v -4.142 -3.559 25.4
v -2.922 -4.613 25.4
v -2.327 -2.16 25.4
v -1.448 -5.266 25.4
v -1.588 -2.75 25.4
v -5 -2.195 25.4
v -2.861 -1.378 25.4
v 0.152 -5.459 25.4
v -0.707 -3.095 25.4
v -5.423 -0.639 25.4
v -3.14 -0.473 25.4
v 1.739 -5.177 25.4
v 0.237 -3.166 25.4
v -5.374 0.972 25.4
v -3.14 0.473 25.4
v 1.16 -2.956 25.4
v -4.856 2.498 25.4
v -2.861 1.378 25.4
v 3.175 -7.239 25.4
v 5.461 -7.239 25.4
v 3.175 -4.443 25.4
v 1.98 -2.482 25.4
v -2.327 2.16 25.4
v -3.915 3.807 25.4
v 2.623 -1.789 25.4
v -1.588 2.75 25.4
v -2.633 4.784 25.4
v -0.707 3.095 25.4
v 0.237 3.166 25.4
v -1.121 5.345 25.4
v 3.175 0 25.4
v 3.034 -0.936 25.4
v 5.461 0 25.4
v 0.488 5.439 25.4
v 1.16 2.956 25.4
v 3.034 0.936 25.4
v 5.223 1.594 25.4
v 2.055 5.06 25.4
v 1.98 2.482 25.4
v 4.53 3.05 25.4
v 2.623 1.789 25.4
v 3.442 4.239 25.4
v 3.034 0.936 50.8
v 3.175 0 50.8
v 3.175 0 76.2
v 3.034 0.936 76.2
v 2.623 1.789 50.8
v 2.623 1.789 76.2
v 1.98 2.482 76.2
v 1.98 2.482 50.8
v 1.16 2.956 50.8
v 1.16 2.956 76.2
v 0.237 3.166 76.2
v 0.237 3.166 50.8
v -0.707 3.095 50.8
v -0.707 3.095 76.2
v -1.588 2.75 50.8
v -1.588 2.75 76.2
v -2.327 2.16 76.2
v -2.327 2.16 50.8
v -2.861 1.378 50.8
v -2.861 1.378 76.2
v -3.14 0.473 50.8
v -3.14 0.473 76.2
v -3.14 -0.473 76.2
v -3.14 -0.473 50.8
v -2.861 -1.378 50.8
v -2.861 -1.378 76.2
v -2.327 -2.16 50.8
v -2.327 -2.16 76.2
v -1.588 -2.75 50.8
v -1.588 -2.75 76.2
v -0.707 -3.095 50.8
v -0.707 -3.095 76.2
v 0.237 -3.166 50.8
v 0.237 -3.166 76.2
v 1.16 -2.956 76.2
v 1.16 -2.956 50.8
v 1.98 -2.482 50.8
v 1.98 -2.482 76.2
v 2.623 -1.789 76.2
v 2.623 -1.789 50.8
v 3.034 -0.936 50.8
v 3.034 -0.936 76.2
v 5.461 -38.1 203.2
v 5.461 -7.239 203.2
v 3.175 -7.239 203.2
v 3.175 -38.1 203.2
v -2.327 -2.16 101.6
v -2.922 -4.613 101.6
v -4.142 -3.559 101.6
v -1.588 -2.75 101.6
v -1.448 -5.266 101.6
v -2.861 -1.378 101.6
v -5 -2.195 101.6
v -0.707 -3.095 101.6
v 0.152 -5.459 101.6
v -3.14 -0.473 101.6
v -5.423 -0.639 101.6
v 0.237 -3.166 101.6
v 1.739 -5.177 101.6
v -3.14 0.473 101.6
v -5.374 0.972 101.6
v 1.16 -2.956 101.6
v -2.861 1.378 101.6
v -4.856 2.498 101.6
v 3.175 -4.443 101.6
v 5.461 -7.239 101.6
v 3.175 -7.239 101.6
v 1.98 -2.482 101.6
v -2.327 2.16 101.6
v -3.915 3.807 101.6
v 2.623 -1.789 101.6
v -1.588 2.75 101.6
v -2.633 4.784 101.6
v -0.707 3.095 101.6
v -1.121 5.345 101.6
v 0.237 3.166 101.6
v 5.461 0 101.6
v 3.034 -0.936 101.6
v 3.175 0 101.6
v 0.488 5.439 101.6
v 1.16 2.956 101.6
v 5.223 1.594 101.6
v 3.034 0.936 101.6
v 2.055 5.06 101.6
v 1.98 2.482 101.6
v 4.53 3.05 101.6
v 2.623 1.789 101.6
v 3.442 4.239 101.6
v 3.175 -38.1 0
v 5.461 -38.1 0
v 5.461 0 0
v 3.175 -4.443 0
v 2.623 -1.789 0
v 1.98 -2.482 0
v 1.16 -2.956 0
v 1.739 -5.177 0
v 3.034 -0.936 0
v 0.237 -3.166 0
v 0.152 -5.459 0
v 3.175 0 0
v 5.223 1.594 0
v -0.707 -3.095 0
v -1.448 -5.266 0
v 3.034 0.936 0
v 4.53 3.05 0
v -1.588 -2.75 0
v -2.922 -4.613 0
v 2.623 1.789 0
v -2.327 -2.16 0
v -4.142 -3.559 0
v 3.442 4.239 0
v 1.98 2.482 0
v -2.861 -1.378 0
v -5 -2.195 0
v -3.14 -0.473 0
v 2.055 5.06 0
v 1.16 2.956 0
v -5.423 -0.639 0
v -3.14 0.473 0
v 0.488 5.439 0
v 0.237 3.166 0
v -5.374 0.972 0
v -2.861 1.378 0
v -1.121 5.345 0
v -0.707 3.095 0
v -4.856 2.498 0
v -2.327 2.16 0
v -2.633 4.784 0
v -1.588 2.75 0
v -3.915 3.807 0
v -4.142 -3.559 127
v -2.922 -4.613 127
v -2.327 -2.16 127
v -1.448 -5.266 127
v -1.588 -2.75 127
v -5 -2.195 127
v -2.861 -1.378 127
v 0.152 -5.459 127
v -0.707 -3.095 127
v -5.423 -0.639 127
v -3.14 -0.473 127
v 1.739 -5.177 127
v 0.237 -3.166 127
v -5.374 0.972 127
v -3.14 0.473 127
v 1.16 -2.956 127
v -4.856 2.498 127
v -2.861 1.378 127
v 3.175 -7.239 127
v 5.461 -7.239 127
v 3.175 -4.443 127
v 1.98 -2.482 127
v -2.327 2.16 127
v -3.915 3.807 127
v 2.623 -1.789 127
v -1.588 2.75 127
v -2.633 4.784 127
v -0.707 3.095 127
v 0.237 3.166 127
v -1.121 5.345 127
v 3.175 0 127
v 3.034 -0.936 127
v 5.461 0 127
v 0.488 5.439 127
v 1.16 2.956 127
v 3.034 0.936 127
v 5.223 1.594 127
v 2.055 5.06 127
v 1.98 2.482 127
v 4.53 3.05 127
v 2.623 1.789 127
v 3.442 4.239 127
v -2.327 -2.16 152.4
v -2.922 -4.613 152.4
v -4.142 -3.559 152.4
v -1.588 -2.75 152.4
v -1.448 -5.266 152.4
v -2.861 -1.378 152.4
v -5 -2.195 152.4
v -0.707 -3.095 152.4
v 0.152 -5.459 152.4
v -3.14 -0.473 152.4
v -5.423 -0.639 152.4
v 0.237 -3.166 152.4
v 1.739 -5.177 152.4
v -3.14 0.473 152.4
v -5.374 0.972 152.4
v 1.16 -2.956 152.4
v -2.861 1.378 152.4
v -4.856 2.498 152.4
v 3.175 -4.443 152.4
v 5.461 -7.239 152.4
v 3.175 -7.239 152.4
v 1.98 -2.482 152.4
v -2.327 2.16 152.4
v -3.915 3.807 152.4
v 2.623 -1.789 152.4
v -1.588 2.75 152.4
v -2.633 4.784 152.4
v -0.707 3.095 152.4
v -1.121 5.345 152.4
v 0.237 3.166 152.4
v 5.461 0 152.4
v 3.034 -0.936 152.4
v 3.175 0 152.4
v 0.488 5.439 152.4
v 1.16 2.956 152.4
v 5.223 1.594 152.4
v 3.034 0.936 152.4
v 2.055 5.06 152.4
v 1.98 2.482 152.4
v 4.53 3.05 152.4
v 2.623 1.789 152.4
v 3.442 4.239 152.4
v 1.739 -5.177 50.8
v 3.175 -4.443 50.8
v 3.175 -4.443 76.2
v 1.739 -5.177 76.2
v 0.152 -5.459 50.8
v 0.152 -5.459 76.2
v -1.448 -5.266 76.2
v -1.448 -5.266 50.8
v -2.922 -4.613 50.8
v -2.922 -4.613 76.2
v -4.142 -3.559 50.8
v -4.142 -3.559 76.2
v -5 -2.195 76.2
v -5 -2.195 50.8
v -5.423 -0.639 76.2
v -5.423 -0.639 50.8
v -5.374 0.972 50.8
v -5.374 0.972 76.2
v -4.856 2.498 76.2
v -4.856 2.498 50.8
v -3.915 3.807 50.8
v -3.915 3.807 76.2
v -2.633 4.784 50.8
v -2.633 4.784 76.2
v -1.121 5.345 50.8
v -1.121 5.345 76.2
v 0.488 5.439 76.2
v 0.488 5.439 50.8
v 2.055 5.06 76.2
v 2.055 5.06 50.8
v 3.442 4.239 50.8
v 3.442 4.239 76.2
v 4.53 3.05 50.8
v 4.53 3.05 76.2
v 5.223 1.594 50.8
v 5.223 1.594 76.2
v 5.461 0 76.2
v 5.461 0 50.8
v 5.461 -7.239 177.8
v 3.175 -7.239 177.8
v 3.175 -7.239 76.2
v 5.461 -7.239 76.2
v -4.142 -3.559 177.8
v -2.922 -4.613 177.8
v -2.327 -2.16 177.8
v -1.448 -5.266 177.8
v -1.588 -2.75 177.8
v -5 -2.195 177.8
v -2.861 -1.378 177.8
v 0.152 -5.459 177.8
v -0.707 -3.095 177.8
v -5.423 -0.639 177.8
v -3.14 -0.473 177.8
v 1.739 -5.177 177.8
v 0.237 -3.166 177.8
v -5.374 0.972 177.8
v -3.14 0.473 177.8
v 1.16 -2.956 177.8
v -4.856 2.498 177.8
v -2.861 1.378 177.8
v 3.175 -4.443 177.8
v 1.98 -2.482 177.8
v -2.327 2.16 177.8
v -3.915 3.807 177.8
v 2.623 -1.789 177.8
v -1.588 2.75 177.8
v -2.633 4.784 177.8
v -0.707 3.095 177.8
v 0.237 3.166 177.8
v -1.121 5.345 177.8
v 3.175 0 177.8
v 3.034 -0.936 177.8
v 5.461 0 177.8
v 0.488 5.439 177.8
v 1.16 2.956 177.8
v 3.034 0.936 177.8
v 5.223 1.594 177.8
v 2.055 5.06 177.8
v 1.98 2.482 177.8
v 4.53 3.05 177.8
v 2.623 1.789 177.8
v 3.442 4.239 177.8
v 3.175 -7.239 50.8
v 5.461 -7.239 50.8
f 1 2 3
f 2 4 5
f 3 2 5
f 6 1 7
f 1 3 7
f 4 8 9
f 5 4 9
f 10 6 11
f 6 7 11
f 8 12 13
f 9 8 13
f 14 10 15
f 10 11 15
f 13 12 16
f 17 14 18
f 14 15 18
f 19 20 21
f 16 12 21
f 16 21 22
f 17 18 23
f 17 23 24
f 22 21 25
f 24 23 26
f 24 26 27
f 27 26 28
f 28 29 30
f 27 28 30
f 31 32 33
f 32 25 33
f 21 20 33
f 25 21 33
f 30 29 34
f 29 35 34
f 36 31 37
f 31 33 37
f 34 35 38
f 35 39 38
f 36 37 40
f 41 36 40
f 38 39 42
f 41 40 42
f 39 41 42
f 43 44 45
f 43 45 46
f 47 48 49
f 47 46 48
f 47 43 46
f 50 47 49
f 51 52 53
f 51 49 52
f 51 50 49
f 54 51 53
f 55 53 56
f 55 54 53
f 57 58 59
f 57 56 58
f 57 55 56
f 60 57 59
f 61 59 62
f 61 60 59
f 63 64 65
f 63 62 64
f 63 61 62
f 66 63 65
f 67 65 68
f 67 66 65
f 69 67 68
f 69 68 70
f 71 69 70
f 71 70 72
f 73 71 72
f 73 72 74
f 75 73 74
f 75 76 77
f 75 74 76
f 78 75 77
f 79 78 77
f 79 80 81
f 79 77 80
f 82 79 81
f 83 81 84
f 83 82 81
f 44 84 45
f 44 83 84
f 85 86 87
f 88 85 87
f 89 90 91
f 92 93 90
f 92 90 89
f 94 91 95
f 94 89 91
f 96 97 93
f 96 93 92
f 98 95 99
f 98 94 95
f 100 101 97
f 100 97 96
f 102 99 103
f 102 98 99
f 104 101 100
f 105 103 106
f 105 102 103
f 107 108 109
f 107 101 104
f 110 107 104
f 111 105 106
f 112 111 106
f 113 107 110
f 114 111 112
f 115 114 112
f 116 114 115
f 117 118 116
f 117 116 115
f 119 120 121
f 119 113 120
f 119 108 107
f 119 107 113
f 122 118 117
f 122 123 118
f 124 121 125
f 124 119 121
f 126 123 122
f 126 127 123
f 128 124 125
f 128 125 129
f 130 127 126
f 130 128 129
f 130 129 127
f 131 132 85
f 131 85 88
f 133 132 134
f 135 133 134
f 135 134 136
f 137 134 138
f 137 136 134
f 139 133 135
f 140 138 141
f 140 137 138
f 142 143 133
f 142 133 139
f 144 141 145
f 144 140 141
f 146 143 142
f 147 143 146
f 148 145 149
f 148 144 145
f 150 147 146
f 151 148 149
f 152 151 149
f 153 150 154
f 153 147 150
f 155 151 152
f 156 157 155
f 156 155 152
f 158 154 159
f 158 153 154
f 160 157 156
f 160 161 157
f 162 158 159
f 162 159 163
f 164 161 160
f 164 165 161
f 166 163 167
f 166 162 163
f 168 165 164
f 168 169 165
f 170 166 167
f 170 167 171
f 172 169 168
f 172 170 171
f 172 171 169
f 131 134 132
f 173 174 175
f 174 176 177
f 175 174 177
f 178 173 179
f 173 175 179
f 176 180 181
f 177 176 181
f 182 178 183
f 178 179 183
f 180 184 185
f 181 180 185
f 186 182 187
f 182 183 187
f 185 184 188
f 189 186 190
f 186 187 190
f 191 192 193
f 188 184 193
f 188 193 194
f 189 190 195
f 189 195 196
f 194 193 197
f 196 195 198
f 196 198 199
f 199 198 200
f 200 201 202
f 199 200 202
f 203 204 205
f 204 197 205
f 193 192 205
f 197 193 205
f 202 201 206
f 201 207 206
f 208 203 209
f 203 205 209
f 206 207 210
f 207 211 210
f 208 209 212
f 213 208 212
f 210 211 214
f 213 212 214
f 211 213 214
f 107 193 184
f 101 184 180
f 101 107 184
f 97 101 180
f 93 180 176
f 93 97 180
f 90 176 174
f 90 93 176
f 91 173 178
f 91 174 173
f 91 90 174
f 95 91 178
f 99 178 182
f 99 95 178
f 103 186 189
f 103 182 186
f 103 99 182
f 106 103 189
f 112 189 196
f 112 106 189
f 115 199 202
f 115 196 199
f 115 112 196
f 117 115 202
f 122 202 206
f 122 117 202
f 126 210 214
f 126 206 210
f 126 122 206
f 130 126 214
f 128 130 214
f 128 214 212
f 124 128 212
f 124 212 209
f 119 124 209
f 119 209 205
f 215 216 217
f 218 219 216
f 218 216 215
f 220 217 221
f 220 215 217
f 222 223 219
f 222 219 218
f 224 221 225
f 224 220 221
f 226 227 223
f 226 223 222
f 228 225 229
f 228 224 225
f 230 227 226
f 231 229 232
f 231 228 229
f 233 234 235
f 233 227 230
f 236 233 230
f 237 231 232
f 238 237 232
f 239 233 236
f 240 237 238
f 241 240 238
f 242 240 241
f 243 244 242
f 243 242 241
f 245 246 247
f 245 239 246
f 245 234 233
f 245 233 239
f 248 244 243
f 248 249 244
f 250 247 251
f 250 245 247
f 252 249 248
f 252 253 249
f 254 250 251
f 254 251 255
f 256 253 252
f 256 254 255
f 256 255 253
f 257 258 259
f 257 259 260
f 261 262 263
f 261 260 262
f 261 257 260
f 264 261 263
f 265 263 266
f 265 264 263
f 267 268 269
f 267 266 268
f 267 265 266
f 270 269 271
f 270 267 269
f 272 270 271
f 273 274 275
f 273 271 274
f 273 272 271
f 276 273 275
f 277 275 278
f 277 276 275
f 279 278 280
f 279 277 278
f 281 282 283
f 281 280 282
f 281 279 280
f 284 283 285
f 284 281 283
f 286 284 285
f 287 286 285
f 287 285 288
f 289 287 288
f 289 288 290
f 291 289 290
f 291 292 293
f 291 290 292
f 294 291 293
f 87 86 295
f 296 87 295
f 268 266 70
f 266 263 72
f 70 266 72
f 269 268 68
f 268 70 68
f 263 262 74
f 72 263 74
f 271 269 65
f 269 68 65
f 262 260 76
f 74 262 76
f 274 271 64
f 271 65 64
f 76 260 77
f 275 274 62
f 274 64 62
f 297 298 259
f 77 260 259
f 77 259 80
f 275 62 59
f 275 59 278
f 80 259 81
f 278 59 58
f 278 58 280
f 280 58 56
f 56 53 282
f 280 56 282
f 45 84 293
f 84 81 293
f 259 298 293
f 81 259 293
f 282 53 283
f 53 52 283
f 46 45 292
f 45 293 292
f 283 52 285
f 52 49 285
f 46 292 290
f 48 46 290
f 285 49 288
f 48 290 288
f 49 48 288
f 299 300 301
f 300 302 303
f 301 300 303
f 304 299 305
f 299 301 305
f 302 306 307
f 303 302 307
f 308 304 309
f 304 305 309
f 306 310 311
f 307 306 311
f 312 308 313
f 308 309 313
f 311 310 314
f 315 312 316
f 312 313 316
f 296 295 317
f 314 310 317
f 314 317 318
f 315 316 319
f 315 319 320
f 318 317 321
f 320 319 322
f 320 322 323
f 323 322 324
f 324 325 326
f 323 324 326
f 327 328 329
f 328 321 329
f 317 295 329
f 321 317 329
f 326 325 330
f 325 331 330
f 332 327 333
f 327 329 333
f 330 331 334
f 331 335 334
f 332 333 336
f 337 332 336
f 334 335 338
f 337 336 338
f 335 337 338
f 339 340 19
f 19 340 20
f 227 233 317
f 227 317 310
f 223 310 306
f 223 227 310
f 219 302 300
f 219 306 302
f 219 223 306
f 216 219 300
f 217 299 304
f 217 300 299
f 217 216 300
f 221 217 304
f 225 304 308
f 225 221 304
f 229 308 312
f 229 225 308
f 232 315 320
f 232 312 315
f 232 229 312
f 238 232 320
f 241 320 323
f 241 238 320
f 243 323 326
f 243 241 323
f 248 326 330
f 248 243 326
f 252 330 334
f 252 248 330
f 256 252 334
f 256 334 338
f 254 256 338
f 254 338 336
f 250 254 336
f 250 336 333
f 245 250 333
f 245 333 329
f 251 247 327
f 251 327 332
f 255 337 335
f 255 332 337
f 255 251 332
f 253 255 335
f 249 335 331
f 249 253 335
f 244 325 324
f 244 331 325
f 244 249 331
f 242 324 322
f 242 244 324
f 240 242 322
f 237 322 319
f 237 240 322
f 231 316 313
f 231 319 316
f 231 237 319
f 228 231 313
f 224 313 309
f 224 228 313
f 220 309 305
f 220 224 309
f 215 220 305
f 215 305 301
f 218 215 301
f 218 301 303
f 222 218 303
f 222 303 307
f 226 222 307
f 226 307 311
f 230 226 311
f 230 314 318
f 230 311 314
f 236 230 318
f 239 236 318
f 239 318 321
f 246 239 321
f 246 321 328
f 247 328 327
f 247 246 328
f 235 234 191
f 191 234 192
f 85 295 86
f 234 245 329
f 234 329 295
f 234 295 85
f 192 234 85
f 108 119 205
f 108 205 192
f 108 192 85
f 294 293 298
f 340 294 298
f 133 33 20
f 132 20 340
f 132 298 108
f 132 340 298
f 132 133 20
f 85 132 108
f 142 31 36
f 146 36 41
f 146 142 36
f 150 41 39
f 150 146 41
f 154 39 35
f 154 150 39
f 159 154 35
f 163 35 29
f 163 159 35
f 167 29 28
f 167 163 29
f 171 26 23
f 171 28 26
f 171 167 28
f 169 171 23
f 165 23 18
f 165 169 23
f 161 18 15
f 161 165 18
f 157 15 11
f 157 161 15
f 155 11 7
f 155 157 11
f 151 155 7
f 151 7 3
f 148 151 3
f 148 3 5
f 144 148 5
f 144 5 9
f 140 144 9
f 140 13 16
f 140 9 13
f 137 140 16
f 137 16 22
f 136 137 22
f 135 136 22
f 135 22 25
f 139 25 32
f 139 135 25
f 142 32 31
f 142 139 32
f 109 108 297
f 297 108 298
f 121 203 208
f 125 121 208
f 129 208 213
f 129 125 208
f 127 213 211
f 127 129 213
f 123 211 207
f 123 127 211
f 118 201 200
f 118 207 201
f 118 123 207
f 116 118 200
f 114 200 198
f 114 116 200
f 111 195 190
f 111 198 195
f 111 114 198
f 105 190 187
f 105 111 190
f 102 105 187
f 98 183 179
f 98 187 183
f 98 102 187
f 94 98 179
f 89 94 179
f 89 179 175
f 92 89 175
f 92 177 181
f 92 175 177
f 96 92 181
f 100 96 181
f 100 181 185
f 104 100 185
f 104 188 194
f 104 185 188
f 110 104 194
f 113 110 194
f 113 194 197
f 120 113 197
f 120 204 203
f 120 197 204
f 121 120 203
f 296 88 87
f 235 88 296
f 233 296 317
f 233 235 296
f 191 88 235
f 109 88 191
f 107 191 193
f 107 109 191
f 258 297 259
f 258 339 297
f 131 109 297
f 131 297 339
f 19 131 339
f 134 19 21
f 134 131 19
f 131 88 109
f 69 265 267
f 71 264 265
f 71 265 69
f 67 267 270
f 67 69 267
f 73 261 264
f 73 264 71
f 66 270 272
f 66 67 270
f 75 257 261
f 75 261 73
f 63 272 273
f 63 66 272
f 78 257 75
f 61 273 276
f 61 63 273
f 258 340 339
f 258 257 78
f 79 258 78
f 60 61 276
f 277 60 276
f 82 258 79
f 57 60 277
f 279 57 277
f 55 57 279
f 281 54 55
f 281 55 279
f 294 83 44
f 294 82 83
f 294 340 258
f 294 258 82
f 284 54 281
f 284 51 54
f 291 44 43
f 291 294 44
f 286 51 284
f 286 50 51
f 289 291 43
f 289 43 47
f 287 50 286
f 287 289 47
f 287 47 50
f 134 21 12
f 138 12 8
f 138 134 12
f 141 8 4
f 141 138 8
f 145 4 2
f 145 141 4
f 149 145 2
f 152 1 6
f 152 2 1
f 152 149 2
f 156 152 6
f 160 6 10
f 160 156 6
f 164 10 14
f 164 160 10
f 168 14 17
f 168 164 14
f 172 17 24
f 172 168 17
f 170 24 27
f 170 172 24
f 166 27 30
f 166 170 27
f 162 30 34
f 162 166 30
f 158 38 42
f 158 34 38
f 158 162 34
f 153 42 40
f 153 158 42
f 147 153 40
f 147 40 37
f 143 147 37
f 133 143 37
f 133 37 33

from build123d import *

# Parameters (mm, degrees)
SKETCH1_R           = 3.175
BOSS_EXTRUDE1_DEPTH = 203.2
SKETCH2_W           = 25.4
SKETCH2_H           = 12.7
CUT_EXTRUDE1_DEPTH  = 11.922
LPATTERN1_COUNT     = 4
LPATTERN1_PITCH     = 50.8


with BuildPart() as part:
    # Sketch1 → Boss-Extrude1 (new body)
    with BuildSketch(Plane.XY):
        with BuildLine():
            Line((5.461, 0), (5.461, -38.1))
            Line((5.461, -38.1), (3.175, -38.1))
            Line((3.175, -38.1), (3.175, -4.443185344))
            ThreePointArc((3.175, -4.443185344), (-4.855985791, 2.498384078), (5.461, 0))
        make_face()
        Circle(SKETCH1_R, mode=Mode.SUBTRACT)
    extrude(amount=BOSS_EXTRUDE1_DEPTH)

    # Sketch2 → Cut-Extrude1 (cut, through all)
    with BuildSketch(Plane(origin=(5.461, 0, 0), x_dir=(0, 0, -1), z_dir=(1, 0, 0))):
        with Locations((-190.5, -0.889)):
            Rectangle(SKETCH2_W, SKETCH2_H)
    cut_extrude1 = extrude(amount=-CUT_EXTRUDE1_DEPTH, mode=Mode.SUBTRACT)

    # LPattern1: Cut-Extrude1 ×4
    with Locations(*[(0, 0, -i * LPATTERN1_PITCH) for i in range(1, LPATTERN1_COUNT)]):
        add(cut_extrude1, mode=Mode.SUBTRACT)


solid = part.part
